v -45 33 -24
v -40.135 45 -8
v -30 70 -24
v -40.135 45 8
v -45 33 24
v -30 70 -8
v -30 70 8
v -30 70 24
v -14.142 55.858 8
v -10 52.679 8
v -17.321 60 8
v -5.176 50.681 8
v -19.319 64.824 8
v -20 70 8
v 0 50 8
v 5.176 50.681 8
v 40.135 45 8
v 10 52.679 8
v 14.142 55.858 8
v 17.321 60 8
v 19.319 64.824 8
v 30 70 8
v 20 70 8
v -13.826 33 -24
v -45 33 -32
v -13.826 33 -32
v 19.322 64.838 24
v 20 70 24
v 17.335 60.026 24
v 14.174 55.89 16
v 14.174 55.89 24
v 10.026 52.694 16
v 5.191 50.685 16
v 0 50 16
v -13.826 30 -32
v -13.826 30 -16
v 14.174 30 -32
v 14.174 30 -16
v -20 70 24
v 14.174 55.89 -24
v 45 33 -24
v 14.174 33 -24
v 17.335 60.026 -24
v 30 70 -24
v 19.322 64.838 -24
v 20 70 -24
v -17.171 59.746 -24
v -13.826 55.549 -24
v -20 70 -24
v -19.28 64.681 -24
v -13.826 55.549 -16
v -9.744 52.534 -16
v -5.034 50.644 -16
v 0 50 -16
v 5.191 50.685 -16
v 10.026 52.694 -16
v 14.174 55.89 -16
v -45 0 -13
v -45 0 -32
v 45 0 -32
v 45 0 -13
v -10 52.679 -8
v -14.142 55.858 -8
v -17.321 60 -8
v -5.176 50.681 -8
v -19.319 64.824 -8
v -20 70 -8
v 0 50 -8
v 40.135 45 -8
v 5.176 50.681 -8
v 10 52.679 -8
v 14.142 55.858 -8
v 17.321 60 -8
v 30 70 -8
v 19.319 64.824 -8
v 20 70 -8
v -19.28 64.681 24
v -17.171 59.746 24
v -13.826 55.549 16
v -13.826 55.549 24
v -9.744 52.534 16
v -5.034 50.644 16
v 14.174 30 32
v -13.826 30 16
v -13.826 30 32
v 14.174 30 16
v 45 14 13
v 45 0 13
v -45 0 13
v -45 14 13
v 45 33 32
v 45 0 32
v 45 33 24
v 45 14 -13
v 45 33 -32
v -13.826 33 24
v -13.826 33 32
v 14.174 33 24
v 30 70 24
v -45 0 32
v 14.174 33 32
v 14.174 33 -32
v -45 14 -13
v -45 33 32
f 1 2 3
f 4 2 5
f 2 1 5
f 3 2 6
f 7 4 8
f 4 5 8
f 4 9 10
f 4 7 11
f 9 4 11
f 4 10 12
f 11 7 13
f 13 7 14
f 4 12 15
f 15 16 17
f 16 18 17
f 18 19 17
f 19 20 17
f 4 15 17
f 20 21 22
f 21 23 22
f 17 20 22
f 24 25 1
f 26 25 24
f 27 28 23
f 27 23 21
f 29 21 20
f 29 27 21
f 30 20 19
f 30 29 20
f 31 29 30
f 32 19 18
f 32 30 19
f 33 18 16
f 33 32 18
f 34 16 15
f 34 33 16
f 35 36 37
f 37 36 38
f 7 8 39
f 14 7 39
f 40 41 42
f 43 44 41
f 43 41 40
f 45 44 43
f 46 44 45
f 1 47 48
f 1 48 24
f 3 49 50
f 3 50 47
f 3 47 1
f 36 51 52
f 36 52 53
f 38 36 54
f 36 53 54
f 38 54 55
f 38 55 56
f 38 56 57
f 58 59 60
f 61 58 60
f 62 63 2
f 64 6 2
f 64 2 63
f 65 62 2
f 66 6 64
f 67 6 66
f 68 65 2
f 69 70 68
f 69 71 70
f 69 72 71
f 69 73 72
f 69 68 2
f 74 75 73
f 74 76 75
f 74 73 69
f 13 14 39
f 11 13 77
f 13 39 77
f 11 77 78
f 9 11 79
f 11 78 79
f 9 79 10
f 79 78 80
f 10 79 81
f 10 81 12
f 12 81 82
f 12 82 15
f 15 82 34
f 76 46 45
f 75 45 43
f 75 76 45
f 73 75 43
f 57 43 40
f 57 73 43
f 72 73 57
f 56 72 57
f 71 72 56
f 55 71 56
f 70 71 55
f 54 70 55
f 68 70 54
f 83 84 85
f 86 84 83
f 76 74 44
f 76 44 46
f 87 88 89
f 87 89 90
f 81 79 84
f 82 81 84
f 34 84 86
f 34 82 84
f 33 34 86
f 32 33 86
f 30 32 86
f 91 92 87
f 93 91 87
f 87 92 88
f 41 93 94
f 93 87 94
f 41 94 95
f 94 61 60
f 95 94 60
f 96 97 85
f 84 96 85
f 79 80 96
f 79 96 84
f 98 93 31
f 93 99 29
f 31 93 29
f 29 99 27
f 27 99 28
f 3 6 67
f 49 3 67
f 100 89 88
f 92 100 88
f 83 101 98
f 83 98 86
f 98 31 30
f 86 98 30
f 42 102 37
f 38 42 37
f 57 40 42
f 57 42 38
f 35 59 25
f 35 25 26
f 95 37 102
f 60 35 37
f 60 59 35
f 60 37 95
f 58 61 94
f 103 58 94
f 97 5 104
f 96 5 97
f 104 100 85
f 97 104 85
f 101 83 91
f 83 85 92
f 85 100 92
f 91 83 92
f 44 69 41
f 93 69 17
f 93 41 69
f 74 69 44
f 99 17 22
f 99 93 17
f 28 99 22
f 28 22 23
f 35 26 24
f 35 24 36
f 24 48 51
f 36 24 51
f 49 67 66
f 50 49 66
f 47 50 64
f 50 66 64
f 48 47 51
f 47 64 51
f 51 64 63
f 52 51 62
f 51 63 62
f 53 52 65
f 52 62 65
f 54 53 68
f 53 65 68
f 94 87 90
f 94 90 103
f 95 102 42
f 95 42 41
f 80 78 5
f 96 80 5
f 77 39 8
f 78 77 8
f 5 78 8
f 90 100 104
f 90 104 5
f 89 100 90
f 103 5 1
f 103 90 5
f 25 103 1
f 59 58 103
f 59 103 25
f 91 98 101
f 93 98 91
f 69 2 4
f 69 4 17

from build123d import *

# Parameters (mm, degrees)
SKETCH1_W           = 90
SKETCH1_H           = 64
BOSS_EXTRUDE1_DEPTH = 33
SKETCH2_W           = 26
SKETCH2_H           = 14
CUT_EXTRUDE1_DEPTH  = 102.05938848
BOSS_EXTRUDE2_DEPTH = 24
SKETCH4_W           = 86.893013234
SKETCH4_H           = 16
CUT_EXTRUDE2_DEPTH  = 25
SKETCH6_W           = 28
SKETCH6_H           = 16
CUT_EXTRUDE3_DEPTH  = 40


with BuildPart() as part:
    # Sketch1 → Boss-Extrude1 (new body)
    with BuildSketch(Plane(origin=(0, 0, 0), x_dir=(1, 0, 0), z_dir=(0, 1, 0))):
        Rectangle(SKETCH1_W, SKETCH1_H)
    extrude(amount=BOSS_EXTRUDE1_DEPTH)

    # Sketch2 → Cut-Extrude1 (cut, through all)
    with BuildSketch(Plane(origin=(45, 0, 0), x_dir=(0, 0, -1), z_dir=(1, 0, 0))):
        with Locations((0, 7)):
            Rectangle(SKETCH2_W, SKETCH2_H)
    extrude(amount=-CUT_EXTRUDE1_DEPTH, mode=Mode.SUBTRACT)

    # Sketch3 → Boss-Extrude2 (add, symmetric)
    with BuildSketch(Plane.XY):
        with BuildLine():
            Line((0, 50), (0, 33))
            Line((0, 33), (45, 33))
            Line((45, 33), (30, 70))
            Line((30, 70), (20, 70))
            ThreePointArc((20, 70), (14.142135624, 55.857864376), (0, 50))
        make_face()
    boss_extrude2 = extrude(amount=BOSS_EXTRUDE2_DEPTH, both=True)

    # Mirror2: Boss-Extrude2 across plane
    add(boss_extrude2.mirror(Plane(origin=(0, 0, 0), x_dir=(0, 0, 1), z_dir=(1, 0, 0))))

    # Sketch4 → Cut-Extrude2 (cut)
    with BuildSketch(Plane(origin=(0, 70, 0), x_dir=(1, 0, 0), z_dir=(0, 1, 0))):
        Rectangle(SKETCH4_W, SKETCH4_H)
    extrude(amount=-CUT_EXTRUDE2_DEPTH, mode=Mode.SUBTRACT)

    # Sketch6 → Cut-Extrude3 (cut)
    with BuildSketch(Plane(origin=(0, 70, 0), x_dir=(1, 0, 0), z_dir=(0, 1, 0))):
        with Locations((0.173717363, -24)):
            Rectangle(SKETCH6_W, SKETCH6_H)
    cut_extrude3 = extrude(amount=-CUT_EXTRUDE3_DEPTH, mode=Mode.SUBTRACT)

    # Mirror3: Cut-Extrude3 across plane
    add(cut_extrude3.mirror(Plane.XY), mode=Mode.SUBTRACT)


solid = part.part
